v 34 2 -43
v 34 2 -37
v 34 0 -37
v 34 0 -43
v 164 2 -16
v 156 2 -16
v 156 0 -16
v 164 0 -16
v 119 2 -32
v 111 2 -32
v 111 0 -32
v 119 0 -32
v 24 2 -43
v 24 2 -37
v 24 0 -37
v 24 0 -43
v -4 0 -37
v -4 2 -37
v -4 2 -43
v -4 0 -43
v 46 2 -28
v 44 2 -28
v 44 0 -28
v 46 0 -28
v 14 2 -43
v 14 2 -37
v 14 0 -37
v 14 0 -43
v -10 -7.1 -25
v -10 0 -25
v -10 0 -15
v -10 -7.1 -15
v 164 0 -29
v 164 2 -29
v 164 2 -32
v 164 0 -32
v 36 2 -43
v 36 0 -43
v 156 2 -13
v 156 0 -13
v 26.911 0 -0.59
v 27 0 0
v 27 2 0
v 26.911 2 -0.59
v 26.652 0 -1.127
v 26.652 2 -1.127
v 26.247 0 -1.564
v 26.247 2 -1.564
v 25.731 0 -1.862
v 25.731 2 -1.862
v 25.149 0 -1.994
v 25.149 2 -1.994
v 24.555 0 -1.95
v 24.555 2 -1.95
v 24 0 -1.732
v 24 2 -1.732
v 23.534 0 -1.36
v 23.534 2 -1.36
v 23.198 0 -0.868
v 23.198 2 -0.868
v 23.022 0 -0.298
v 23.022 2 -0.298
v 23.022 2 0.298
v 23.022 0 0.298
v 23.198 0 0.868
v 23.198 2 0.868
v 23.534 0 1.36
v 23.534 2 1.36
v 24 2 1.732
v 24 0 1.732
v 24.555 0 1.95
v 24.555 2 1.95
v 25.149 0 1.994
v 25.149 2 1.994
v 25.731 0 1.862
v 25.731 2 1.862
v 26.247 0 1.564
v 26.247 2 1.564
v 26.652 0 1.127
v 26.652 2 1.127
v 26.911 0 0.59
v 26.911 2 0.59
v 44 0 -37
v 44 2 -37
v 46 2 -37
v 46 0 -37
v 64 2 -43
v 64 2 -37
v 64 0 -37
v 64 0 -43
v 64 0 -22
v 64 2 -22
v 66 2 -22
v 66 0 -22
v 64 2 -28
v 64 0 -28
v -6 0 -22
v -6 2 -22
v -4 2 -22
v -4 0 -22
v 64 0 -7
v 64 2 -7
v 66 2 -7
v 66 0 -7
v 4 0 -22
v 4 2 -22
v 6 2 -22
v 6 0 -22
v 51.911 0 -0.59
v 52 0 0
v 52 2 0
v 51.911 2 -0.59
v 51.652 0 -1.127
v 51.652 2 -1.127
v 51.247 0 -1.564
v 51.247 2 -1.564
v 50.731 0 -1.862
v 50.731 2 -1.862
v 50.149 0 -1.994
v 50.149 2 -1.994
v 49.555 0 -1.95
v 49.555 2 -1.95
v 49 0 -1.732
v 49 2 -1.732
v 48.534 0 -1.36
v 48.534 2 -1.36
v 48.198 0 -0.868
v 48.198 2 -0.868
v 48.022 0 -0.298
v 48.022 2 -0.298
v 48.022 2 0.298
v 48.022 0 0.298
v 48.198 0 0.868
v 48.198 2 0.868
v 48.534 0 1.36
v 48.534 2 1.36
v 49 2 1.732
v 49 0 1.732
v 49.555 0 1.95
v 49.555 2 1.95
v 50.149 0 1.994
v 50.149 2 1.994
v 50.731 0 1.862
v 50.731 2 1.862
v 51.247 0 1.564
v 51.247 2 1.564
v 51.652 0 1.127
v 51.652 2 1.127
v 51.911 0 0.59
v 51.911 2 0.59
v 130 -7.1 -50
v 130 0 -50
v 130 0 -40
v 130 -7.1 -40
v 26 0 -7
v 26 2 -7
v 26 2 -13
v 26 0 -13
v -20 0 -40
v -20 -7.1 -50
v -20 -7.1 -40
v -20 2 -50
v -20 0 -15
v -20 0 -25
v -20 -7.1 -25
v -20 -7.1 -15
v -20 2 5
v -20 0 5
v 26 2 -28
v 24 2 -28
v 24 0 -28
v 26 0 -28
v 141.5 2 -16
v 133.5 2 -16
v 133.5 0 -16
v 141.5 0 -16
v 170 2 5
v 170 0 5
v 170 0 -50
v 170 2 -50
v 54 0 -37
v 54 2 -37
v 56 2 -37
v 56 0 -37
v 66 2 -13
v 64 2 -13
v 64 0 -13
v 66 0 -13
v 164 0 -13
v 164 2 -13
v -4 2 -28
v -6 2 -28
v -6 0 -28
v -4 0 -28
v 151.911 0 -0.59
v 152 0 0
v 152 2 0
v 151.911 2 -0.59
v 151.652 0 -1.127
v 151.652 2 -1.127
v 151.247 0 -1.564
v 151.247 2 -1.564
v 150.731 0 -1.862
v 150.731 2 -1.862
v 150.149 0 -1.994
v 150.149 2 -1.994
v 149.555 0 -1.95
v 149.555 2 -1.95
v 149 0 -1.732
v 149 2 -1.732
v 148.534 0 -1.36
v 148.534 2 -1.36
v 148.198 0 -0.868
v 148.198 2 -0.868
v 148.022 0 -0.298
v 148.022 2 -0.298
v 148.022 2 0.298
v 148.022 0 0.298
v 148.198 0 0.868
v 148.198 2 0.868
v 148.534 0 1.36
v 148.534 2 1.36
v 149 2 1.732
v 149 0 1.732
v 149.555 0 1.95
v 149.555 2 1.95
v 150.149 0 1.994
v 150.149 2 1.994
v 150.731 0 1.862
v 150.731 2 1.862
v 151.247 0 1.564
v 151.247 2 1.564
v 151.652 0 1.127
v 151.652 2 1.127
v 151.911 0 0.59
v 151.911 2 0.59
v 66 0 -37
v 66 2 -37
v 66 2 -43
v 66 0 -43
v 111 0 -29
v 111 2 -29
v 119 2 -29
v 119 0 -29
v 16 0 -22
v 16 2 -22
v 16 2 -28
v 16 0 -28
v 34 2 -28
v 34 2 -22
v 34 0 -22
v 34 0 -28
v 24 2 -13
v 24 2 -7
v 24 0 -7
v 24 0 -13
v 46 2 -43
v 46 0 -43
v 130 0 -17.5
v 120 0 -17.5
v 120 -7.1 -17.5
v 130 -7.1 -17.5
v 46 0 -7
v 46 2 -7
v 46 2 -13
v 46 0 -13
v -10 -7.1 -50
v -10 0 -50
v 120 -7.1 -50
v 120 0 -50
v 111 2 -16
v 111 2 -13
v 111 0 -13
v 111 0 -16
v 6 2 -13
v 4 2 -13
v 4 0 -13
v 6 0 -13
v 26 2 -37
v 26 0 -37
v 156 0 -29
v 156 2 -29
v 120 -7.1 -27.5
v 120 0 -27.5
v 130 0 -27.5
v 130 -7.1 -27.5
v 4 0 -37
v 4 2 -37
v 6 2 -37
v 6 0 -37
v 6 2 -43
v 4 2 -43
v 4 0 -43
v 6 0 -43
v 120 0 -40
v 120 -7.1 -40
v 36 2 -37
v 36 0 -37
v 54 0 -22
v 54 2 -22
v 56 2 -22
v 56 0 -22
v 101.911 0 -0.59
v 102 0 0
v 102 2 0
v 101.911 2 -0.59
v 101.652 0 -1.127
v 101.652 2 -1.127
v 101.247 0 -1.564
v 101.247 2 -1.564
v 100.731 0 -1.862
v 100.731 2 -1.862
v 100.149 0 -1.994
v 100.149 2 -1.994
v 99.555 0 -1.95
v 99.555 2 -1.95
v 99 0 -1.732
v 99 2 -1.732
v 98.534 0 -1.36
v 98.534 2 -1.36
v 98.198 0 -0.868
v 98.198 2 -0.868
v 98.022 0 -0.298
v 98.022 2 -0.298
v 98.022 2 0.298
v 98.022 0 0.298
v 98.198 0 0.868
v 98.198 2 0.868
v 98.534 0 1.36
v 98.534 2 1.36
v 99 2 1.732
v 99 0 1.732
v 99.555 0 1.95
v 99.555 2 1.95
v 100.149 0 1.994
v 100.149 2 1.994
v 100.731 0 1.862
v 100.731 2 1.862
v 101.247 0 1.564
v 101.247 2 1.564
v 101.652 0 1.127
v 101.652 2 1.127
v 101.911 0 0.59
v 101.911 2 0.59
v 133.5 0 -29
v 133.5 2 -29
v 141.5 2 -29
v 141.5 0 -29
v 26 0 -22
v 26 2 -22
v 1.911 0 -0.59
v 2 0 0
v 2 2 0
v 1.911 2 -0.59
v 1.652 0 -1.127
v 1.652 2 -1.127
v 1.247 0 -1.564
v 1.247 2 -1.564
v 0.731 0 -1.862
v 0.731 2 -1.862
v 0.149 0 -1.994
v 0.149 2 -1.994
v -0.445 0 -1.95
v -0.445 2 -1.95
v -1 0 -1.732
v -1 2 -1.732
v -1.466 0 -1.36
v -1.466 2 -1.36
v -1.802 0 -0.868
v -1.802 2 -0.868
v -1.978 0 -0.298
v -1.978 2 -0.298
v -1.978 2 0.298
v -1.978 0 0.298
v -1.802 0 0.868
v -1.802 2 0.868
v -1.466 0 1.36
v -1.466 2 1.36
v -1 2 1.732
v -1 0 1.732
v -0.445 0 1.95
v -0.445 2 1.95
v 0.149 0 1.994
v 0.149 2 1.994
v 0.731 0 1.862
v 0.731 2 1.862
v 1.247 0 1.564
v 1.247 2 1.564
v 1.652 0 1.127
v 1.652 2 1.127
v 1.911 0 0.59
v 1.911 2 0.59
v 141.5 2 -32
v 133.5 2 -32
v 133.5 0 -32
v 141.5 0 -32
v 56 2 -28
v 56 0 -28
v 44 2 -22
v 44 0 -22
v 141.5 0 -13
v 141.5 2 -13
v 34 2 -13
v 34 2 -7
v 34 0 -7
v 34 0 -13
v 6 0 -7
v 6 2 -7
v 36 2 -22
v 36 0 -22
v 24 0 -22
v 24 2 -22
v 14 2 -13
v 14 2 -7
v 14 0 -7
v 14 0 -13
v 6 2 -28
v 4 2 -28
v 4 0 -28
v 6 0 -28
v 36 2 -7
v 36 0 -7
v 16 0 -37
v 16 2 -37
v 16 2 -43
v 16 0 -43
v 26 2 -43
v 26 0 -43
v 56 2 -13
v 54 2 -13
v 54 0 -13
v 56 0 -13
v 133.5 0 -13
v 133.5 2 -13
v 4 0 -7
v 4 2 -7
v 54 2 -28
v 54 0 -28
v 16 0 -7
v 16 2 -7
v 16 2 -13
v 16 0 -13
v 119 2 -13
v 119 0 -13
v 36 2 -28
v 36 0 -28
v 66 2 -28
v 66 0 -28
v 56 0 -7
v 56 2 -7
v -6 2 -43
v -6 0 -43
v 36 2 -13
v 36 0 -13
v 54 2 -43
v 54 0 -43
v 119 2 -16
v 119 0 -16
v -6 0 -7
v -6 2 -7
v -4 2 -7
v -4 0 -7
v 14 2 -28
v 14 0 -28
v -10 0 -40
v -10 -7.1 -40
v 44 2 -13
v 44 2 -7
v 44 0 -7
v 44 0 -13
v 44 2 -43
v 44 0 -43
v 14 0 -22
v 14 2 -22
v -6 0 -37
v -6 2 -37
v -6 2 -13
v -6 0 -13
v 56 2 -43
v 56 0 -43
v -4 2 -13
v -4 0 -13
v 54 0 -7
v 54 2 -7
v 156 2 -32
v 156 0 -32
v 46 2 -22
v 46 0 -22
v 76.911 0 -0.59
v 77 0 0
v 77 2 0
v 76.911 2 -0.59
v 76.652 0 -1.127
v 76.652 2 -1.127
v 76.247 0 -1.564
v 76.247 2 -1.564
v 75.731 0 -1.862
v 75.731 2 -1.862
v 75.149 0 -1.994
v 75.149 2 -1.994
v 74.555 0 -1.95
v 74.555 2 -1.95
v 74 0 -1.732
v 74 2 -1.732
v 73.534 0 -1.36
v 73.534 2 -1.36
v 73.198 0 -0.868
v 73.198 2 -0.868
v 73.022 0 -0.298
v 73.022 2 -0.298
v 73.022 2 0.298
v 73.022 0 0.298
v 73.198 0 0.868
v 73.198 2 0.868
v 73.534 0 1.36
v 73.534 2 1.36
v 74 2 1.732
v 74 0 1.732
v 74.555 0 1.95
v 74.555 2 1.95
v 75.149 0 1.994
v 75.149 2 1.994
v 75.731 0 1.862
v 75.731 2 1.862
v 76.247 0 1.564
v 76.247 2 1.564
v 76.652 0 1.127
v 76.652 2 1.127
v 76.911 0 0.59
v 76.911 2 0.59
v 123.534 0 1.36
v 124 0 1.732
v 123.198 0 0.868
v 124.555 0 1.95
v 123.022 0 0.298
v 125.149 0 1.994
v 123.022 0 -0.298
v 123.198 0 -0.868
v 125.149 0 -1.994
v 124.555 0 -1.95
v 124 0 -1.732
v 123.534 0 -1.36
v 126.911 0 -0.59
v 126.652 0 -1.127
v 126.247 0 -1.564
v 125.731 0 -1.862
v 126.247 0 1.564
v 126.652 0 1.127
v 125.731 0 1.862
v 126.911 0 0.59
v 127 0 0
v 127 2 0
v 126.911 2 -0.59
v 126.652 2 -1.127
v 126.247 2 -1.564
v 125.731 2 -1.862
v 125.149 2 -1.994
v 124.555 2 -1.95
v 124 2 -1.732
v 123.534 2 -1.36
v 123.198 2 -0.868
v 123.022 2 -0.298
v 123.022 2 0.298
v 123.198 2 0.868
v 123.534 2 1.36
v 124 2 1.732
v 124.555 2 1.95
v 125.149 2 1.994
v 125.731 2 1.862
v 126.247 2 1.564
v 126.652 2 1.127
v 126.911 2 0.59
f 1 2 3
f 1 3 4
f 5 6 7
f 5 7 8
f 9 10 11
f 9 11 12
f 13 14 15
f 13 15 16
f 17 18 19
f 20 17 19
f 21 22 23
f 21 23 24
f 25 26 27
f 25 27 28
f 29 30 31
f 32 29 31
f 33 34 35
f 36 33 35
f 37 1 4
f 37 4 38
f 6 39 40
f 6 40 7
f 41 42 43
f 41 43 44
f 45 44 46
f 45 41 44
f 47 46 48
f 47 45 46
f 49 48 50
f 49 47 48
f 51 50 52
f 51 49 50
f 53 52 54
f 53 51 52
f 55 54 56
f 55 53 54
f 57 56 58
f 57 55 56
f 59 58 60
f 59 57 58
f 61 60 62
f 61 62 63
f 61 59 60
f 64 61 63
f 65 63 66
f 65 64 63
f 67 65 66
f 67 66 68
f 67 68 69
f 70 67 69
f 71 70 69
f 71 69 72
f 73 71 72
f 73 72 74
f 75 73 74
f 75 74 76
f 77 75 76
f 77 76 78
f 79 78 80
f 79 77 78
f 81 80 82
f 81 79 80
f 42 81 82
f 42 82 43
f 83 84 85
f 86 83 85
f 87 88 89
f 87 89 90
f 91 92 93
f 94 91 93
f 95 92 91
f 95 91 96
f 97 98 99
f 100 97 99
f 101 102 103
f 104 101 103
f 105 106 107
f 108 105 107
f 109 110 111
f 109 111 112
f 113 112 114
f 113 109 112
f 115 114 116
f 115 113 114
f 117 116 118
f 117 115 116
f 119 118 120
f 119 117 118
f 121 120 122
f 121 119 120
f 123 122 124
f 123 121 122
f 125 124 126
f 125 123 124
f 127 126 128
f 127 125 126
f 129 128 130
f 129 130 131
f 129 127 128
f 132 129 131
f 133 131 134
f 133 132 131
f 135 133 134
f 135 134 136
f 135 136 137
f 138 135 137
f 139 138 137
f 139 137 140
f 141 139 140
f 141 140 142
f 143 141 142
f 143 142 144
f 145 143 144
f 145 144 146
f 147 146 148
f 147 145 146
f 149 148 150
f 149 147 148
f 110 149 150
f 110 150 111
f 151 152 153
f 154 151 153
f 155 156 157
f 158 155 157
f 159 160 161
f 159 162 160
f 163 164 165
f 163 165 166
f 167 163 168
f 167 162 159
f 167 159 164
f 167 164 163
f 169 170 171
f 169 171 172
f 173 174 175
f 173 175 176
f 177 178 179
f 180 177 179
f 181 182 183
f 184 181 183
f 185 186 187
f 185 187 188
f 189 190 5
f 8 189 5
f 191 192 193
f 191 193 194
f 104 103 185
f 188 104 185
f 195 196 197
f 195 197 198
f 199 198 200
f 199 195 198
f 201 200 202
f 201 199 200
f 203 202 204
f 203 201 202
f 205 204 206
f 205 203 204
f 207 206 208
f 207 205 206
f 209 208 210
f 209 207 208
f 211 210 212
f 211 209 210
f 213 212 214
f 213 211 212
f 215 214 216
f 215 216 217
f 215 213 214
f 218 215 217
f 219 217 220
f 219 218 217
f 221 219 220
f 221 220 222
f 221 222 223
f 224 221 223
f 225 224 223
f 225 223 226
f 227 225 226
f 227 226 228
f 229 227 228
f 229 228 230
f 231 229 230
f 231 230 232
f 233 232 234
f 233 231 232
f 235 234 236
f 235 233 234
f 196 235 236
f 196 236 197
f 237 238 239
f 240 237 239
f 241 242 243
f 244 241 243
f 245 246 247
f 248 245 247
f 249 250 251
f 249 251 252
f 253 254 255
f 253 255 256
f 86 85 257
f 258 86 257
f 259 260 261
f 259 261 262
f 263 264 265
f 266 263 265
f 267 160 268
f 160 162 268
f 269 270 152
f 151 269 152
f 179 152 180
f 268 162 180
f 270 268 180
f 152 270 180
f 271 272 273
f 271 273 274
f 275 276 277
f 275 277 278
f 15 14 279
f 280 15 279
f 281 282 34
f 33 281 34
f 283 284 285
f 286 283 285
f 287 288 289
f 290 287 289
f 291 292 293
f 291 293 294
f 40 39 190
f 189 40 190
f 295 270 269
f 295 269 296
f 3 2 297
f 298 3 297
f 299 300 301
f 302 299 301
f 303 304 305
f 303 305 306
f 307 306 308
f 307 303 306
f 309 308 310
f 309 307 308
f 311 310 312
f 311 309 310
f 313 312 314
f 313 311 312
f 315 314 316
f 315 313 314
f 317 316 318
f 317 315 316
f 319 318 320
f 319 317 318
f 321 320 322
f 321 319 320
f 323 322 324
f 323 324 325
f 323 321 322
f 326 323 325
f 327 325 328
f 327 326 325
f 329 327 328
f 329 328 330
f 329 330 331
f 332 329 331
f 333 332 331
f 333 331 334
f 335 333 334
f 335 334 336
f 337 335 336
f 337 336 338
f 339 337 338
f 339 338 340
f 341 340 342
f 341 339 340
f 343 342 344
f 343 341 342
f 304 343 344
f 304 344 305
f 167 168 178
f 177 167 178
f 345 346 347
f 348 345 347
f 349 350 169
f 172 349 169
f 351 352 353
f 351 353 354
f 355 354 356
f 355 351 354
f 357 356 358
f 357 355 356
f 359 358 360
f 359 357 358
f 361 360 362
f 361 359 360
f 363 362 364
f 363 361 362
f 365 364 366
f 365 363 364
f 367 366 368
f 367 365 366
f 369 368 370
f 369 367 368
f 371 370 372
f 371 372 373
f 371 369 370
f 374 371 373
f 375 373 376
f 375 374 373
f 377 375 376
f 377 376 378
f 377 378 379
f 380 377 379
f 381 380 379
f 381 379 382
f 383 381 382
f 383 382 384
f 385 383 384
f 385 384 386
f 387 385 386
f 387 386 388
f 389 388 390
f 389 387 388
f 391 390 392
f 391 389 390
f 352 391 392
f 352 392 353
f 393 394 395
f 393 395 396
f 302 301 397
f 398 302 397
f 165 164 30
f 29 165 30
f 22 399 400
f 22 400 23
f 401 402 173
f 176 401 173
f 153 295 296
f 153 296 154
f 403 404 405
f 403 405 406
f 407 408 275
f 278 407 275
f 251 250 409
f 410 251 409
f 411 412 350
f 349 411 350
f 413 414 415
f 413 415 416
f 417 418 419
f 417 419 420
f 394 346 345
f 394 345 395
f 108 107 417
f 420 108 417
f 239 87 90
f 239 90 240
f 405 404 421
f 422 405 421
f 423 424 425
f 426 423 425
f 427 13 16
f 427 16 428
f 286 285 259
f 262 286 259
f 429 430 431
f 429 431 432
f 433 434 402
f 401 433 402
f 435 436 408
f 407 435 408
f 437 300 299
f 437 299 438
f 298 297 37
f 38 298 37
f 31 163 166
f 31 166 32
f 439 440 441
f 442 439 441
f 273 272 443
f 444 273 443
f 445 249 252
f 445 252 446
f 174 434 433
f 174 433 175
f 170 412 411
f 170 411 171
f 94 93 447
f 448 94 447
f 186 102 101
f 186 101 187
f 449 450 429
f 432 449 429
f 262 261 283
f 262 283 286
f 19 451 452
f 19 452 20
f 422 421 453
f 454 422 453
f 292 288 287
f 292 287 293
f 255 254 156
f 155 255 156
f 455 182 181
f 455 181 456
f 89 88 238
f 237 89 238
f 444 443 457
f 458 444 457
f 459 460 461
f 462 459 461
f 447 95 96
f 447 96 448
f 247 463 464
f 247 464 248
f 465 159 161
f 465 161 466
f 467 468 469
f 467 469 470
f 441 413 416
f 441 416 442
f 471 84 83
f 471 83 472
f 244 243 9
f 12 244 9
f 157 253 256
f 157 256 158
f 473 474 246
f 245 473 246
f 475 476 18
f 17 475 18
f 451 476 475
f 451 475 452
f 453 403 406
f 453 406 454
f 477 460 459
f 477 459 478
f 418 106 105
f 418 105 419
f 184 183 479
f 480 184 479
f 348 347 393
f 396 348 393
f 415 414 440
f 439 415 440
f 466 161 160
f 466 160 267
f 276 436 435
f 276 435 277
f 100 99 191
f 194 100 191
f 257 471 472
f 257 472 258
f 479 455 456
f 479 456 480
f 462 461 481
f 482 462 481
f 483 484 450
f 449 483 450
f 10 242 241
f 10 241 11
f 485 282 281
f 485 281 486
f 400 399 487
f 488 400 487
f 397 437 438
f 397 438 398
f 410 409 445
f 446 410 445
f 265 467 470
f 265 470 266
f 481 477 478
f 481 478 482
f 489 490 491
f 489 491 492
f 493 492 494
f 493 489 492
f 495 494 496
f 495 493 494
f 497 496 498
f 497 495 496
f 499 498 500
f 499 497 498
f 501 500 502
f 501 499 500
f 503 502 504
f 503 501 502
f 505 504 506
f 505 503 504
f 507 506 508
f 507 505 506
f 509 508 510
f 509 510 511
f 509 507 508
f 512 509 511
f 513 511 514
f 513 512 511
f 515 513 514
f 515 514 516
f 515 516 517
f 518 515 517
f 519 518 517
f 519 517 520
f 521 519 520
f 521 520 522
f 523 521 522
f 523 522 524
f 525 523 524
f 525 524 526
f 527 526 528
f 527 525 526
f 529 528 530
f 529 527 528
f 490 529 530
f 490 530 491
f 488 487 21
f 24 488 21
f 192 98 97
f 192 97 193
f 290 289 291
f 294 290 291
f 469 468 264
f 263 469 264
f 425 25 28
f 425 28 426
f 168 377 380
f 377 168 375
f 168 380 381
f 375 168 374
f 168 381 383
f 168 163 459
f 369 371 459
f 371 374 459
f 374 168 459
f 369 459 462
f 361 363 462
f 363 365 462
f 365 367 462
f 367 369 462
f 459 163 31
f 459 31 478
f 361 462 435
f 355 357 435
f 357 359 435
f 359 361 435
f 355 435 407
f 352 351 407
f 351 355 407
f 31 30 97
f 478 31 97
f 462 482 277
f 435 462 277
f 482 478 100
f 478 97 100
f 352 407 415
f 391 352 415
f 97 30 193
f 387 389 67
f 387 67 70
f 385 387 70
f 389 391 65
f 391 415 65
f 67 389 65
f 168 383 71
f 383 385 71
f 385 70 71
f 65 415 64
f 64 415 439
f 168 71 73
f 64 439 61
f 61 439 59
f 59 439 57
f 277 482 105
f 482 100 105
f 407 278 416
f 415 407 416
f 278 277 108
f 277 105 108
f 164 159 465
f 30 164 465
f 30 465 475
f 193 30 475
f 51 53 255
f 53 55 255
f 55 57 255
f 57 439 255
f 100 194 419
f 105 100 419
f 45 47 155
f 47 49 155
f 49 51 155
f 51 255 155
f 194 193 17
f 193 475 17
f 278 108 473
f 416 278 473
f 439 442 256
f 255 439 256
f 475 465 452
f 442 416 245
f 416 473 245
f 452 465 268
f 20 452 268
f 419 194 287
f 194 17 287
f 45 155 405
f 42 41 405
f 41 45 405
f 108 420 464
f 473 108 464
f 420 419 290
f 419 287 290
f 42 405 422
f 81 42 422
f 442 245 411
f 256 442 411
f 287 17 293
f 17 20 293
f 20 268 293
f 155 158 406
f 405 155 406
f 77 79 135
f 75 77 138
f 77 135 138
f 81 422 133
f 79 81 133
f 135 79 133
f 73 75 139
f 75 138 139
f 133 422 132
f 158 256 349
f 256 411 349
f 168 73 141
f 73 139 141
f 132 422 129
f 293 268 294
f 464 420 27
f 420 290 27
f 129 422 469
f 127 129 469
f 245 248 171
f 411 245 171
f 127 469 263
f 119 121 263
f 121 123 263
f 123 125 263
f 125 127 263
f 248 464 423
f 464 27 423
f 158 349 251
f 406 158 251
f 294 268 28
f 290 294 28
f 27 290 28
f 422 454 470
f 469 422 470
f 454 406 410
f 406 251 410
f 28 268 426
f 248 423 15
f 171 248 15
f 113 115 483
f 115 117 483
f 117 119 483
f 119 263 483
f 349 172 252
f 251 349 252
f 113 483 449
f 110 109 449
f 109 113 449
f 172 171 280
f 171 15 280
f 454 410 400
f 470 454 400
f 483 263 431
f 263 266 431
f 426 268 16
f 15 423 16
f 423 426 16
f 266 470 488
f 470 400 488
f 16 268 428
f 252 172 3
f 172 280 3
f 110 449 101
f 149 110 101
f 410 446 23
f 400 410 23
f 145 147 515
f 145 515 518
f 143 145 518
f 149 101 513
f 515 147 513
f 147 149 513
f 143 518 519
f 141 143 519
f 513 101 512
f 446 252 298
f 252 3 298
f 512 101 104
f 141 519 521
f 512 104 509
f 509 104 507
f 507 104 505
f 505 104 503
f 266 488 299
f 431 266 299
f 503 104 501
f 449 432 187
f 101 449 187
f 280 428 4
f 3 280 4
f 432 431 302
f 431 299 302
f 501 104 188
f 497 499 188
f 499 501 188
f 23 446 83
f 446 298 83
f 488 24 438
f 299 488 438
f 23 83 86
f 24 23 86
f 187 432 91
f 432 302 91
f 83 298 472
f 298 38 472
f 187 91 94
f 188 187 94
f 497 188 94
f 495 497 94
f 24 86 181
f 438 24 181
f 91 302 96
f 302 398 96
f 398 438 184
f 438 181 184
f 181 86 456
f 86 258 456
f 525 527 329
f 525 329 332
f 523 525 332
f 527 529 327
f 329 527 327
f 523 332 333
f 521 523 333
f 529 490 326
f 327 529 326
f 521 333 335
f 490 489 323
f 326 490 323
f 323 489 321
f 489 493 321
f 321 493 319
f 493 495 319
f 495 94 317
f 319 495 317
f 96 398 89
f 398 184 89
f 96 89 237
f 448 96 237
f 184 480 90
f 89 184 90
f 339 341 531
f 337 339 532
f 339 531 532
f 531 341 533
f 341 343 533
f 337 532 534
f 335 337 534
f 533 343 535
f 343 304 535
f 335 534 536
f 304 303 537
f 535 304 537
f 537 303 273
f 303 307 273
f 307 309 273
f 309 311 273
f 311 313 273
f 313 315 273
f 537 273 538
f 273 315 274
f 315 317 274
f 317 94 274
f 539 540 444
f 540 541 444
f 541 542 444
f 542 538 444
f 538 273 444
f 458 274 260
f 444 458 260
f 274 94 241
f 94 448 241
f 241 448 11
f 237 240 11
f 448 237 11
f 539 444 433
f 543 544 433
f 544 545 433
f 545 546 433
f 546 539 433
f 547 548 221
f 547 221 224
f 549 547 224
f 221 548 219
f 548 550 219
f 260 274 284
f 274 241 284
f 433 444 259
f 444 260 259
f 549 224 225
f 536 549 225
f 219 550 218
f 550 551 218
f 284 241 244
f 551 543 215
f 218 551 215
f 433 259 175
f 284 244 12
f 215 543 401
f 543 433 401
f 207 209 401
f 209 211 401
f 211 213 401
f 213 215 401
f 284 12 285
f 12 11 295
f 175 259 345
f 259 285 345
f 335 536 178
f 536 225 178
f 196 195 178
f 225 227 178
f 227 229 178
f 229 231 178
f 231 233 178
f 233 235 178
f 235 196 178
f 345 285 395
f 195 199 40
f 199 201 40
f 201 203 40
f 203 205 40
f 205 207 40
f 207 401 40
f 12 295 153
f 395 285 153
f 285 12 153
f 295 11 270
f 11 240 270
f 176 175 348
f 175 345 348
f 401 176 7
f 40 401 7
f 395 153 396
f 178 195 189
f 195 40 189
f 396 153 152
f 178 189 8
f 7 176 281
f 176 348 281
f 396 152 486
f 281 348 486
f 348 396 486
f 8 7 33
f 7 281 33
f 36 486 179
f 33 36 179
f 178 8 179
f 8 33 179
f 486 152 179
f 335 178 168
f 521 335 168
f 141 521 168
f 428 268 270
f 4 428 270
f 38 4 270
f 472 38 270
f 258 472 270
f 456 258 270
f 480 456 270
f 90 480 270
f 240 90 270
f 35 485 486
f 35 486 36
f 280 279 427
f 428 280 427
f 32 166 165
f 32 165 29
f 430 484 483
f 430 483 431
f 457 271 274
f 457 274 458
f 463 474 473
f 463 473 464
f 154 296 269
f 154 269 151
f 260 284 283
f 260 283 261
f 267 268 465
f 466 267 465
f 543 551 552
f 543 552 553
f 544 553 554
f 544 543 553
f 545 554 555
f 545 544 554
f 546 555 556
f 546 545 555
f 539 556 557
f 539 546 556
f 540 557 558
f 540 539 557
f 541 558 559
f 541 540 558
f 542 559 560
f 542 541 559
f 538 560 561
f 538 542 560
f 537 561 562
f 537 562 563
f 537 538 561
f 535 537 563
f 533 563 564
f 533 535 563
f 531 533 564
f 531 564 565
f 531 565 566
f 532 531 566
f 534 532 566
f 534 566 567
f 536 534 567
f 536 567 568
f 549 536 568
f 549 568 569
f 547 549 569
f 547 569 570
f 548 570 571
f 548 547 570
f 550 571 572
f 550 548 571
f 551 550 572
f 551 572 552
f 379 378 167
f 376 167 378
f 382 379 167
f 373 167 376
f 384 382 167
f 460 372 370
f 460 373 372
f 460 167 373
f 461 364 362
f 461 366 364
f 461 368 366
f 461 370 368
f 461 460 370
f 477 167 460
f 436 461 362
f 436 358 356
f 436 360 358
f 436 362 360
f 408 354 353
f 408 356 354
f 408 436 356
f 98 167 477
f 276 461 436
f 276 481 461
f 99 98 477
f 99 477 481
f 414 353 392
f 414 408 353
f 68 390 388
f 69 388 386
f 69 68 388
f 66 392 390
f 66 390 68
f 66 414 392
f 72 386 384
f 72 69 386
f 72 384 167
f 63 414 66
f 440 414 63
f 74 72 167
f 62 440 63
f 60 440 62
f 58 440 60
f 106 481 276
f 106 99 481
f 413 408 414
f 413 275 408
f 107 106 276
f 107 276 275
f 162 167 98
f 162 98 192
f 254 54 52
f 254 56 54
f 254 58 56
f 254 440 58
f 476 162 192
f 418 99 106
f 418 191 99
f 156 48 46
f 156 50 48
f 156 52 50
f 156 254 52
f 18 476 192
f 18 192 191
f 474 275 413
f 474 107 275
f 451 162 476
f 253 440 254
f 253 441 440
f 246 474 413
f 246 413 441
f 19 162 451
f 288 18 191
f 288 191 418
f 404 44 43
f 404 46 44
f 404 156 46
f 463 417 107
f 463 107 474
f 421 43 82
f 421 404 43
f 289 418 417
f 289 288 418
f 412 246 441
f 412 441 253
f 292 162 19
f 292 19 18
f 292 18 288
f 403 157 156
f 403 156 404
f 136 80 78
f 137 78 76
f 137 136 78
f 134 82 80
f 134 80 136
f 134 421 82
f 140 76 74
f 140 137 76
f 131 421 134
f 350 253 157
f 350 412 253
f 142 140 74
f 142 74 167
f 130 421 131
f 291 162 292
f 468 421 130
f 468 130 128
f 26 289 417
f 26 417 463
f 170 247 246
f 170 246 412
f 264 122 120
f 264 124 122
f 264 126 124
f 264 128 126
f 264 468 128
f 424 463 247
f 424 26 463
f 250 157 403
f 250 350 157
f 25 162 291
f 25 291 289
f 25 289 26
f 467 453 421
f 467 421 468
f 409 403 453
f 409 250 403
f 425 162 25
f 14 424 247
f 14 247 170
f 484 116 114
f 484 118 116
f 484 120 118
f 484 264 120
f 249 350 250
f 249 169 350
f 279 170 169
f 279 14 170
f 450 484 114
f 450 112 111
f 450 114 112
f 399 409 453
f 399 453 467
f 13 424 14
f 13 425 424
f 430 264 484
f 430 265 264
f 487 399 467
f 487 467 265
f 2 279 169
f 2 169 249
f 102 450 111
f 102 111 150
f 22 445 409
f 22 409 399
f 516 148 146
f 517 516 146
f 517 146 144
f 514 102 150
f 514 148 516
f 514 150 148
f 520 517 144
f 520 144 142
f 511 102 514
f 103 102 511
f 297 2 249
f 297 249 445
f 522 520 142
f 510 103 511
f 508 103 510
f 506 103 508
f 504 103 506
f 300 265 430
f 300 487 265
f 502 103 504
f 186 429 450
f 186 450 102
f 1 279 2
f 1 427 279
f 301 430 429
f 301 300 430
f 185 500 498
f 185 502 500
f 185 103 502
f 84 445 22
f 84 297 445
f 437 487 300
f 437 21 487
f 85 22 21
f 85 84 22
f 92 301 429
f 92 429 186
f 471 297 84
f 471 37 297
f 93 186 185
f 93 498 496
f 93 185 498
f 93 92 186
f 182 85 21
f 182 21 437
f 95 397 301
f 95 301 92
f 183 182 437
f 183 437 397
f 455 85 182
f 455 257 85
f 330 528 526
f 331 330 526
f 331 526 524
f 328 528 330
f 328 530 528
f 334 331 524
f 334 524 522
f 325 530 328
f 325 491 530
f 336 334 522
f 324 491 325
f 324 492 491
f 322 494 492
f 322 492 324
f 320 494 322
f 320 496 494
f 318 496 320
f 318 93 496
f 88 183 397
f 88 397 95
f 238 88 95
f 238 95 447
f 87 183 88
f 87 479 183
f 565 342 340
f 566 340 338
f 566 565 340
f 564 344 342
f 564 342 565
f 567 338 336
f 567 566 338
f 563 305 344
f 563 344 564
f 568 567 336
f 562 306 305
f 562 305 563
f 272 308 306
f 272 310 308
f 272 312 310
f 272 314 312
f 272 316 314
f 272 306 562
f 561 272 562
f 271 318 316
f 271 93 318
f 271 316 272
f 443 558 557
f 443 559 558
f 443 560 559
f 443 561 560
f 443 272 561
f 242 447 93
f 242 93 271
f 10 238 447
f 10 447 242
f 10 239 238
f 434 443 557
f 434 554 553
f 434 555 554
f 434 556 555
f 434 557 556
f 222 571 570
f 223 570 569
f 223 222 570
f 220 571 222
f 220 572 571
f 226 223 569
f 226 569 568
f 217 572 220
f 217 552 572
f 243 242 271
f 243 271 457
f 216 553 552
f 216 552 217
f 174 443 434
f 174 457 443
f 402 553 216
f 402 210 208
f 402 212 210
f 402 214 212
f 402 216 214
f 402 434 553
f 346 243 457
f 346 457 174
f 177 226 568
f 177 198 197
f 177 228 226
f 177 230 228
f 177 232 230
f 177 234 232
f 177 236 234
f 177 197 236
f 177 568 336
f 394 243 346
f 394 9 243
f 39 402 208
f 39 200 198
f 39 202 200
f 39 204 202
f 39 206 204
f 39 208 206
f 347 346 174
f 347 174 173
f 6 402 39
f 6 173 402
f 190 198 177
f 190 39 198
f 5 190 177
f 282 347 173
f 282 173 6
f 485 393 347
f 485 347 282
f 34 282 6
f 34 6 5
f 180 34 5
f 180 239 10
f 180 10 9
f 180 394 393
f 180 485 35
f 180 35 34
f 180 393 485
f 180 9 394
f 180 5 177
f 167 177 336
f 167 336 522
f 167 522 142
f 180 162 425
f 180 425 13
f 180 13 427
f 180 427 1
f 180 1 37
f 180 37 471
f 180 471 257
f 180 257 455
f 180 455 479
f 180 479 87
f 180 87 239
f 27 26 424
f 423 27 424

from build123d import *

# Parameters (mm, degrees)
SKETCH1_W                 = 190
SKETCH1_H                 = 55
SKETCH1_R                 = 2
BOSS_EXTRUDE1_DEPTH       = 2
SKETCH2_W                 = 10
SKETCH2_H                 = 10
BOSS_EXTRUDE2_DEPTH       = 7.1
LPATTERN1_COUNT           = 2
LPATTERN1_PITCH           = 22.5
SKETCH3_W                 = 8
SKETCH3_H                 = 3
CUT_EXTRUDE1_DEPTH        = 7.1
LPATTERN2_COUNT           = 3
LPATTERN2_PITCH           = 22.5
SKETCH4_W                 = 2
SKETCH4_H                 = 6
CUT_EXTRUDE2_DEPTH        = 7.1
LPATTERN3_COUNT           = 3
LPATTERN3_PITCH           = 15
LPATTERN4_COUNT           = 4
LPATTERN4_PITCH           = 20
LPATTERN4_COPY_1_SKETCH_W = 2
LPATTERN4_COPY_1_SKETCH_H = 6
LPATTERN4_COPY_1_DEPTH    = 7.1
LPATTERN4_COPY_2_SKETCH_W = 2
LPATTERN4_COPY_2_SKETCH_H = 6
LPATTERN4_COPY_2_DEPTH    = 7.1
LPATTERN4_COPY_3_SKETCH_W = 2
LPATTERN4_COPY_3_SKETCH_H = 6
LPATTERN4_COPY_3_DEPTH    = 7.1
LPATTERN4_COPY_4_SKETCH_W = 2
LPATTERN4_COPY_4_SKETCH_H = 6
LPATTERN4_COPY_4_DEPTH    = 7.1
LPATTERN4_COPY_5_SKETCH_W = 2
LPATTERN4_COPY_5_SKETCH_H = 6
LPATTERN4_COPY_5_DEPTH    = 7.1
LPATTERN4_COPY_6_SKETCH_W = 2
LPATTERN4_COPY_6_SKETCH_H = 6
LPATTERN4_COPY_6_DEPTH    = 7.1
SKETCH5_W                 = 10
SKETCH5_H                 = 10
BOSS_EXTRUDE3_DEPTH       = 7.1


with BuildPart() as part:
    # Sketch1 → Boss-Extrude1 (new body)
    with BuildSketch(Plane(origin=(0, 0, 0), x_dir=(1, 0, 0), z_dir=(0, 1, 0))):
        with Locations((75, 22.5)):
            Rectangle(SKETCH1_W, SKETCH1_H)
        Circle(SKETCH1_R, mode=Mode.SUBTRACT)
        with Locations((25, 0)):
            Circle(SKETCH1_R, mode=Mode.SUBTRACT)
        with Locations((50, 0)):
            Circle(SKETCH1_R, mode=Mode.SUBTRACT)
        with Locations((75, 0)):
            Circle(SKETCH1_R, mode=Mode.SUBTRACT)
        with Locations((100, 0)):
            Circle(SKETCH1_R, mode=Mode.SUBTRACT)
        with Locations((125, 0)):
            Circle(SKETCH1_R, mode=Mode.SUBTRACT)
        with Locations((150, 0)):
            Circle(SKETCH1_R, mode=Mode.SUBTRACT)
    extrude(amount=BOSS_EXTRUDE1_DEPTH)

    # Sketch2 → Boss-Extrude2 (add)
    with BuildSketch(Plane.XZ):
        with Locations((125, -22.5)):
            Rectangle(SKETCH2_W, SKETCH2_H)
    boss_extrude2 = extrude(amount=BOSS_EXTRUDE2_DEPTH)

    # LPattern1: Boss-Extrude2 ×2
    with Locations(*[(0, 0, -i * LPATTERN1_PITCH) for i in range(1, LPATTERN1_COUNT)]):
        add(boss_extrude2)

    # Sketch3 → Cut-Extrude1 (cut)
    with BuildSketch(Plane(origin=(0, 2, 0), x_dir=(1, 0, 0), z_dir=(0, 1, 0))):
        with Locations((160, 30.5)):
            Rectangle(SKETCH3_W, SKETCH3_H)
        with Locations((160, 14.5)):
            Rectangle(SKETCH3_W, SKETCH3_H)
    cut_extrude1 = extrude(amount=-CUT_EXTRUDE1_DEPTH, mode=Mode.SUBTRACT)

    # LPattern2: Cut-Extrude1 ×3
    with Locations(*[(-i * LPATTERN2_PITCH, 0, 0) for i in range(1, LPATTERN2_COUNT)]):
        add(cut_extrude1, mode=Mode.SUBTRACT)

    # Sketch4 → Cut-Extrude2 (cut)
    with BuildSketch(Plane(origin=(0, 2, 0), x_dir=(1, 0, 0), z_dir=(0, 1, 0))):
        with Locations((-5, 10)):
            Rectangle(SKETCH4_W, SKETCH4_H)
        with Locations((5, 10)):
            Rectangle(SKETCH4_W, SKETCH4_H)
    cut_extrude2 = extrude(amount=-CUT_EXTRUDE2_DEPTH, mode=Mode.SUBTRACT)

    # LPattern3: Cut-Extrude2 ×3
    with Locations(*[(0, 0, -i * LPATTERN3_PITCH) for i in range(1, LPATTERN3_COUNT)]):
        add(cut_extrude2, mode=Mode.SUBTRACT)

    # LPattern4: Cut-Extrude2 ×4
    with Locations(*[(i * LPATTERN4_PITCH, 0, 0) for i in range(1, LPATTERN4_COUNT)]):
        add(cut_extrude2, mode=Mode.SUBTRACT)

    # LPattern4 copy 1 sketch → LPattern4 copy 1 (cut)
    with BuildSketch(Plane(origin=(20, 2, -15), x_dir=(1, 0, 0), z_dir=(0, 1, 0))):
        with Locations((-5, 10)):
            Rectangle(LPATTERN4_COPY_1_SKETCH_W, LPATTERN4_COPY_1_SKETCH_H)
        with Locations((5, 10)):
            Rectangle(LPATTERN4_COPY_1_SKETCH_W, LPATTERN4_COPY_1_SKETCH_H)
    extrude(amount=-LPATTERN4_COPY_1_DEPTH, mode=Mode.SUBTRACT)

    # LPattern4 copy 2 sketch → LPattern4 copy 2 (cut)
    with BuildSketch(Plane(origin=(40, 2, -15), x_dir=(1, 0, 0), z_dir=(0, 1, 0))):
        with Locations((-5, 10)):
            Rectangle(LPATTERN4_COPY_2_SKETCH_W, LPATTERN4_COPY_2_SKETCH_H)
        with Locations((5, 10)):
            Rectangle(LPATTERN4_COPY_2_SKETCH_W, LPATTERN4_COPY_2_SKETCH_H)
    extrude(amount=-LPATTERN4_COPY_2_DEPTH, mode=Mode.SUBTRACT)

    # LPattern4 copy 3 sketch → LPattern4 copy 3 (cut)
    with BuildSketch(Plane(origin=(60, 2, -15), x_dir=(1, 0, 0), z_dir=(0, 1, 0))):
        with Locations((-5, 10)):
            Rectangle(LPATTERN4_COPY_3_SKETCH_W, LPATTERN4_COPY_3_SKETCH_H)
        with Locations((5, 10)):
            Rectangle(LPATTERN4_COPY_3_SKETCH_W, LPATTERN4_COPY_3_SKETCH_H)
    extrude(amount=-LPATTERN4_COPY_3_DEPTH, mode=Mode.SUBTRACT)

    # LPattern4 copy 4 sketch → LPattern4 copy 4 (cut)
    with BuildSketch(Plane(origin=(20, 2, -30), x_dir=(1, 0, 0), z_dir=(0, 1, 0))):
        with Locations((-5, 10)):
            Rectangle(LPATTERN4_COPY_4_SKETCH_W, LPATTERN4_COPY_4_SKETCH_H)
        with Locations((5, 10)):
            Rectangle(LPATTERN4_COPY_4_SKETCH_W, LPATTERN4_COPY_4_SKETCH_H)
    extrude(amount=-LPATTERN4_COPY_4_DEPTH, mode=Mode.SUBTRACT)

    # LPattern4 copy 5 sketch → LPattern4 copy 5 (cut)
    with BuildSketch(Plane(origin=(40, 2, -30), x_dir=(1, 0, 0), z_dir=(0, 1, 0))):
        with Locations((-5, 10)):
            Rectangle(LPATTERN4_COPY_5_SKETCH_W, LPATTERN4_COPY_5_SKETCH_H)
        with Locations((5, 10)):
            Rectangle(LPATTERN4_COPY_5_SKETCH_W, LPATTERN4_COPY_5_SKETCH_H)
    extrude(amount=-LPATTERN4_COPY_5_DEPTH, mode=Mode.SUBTRACT)

    # LPattern4 copy 6 sketch → LPattern4 copy 6 (cut)
    with BuildSketch(Plane(origin=(60, 2, -30), x_dir=(1, 0, 0), z_dir=(0, 1, 0))):
        with Locations((-5, 10)):
            Rectangle(LPATTERN4_COPY_6_SKETCH_W, LPATTERN4_COPY_6_SKETCH_H)
        with Locations((5, 10)):
            Rectangle(LPATTERN4_COPY_6_SKETCH_W, LPATTERN4_COPY_6_SKETCH_H)
    extrude(amount=-LPATTERN4_COPY_6_DEPTH, mode=Mode.SUBTRACT)

    # Sketch5 → Boss-Extrude3 (add)
    with BuildSketch(Plane.XZ):
        with Locations((-15, -45)):
            Rectangle(SKETCH5_W, SKETCH5_H)
        with Locations((-15, -20)):
            Rectangle(SKETCH5_W, SKETCH5_H)
    extrude(amount=BOSS_EXTRUDE3_DEPTH)


solid = part.part
